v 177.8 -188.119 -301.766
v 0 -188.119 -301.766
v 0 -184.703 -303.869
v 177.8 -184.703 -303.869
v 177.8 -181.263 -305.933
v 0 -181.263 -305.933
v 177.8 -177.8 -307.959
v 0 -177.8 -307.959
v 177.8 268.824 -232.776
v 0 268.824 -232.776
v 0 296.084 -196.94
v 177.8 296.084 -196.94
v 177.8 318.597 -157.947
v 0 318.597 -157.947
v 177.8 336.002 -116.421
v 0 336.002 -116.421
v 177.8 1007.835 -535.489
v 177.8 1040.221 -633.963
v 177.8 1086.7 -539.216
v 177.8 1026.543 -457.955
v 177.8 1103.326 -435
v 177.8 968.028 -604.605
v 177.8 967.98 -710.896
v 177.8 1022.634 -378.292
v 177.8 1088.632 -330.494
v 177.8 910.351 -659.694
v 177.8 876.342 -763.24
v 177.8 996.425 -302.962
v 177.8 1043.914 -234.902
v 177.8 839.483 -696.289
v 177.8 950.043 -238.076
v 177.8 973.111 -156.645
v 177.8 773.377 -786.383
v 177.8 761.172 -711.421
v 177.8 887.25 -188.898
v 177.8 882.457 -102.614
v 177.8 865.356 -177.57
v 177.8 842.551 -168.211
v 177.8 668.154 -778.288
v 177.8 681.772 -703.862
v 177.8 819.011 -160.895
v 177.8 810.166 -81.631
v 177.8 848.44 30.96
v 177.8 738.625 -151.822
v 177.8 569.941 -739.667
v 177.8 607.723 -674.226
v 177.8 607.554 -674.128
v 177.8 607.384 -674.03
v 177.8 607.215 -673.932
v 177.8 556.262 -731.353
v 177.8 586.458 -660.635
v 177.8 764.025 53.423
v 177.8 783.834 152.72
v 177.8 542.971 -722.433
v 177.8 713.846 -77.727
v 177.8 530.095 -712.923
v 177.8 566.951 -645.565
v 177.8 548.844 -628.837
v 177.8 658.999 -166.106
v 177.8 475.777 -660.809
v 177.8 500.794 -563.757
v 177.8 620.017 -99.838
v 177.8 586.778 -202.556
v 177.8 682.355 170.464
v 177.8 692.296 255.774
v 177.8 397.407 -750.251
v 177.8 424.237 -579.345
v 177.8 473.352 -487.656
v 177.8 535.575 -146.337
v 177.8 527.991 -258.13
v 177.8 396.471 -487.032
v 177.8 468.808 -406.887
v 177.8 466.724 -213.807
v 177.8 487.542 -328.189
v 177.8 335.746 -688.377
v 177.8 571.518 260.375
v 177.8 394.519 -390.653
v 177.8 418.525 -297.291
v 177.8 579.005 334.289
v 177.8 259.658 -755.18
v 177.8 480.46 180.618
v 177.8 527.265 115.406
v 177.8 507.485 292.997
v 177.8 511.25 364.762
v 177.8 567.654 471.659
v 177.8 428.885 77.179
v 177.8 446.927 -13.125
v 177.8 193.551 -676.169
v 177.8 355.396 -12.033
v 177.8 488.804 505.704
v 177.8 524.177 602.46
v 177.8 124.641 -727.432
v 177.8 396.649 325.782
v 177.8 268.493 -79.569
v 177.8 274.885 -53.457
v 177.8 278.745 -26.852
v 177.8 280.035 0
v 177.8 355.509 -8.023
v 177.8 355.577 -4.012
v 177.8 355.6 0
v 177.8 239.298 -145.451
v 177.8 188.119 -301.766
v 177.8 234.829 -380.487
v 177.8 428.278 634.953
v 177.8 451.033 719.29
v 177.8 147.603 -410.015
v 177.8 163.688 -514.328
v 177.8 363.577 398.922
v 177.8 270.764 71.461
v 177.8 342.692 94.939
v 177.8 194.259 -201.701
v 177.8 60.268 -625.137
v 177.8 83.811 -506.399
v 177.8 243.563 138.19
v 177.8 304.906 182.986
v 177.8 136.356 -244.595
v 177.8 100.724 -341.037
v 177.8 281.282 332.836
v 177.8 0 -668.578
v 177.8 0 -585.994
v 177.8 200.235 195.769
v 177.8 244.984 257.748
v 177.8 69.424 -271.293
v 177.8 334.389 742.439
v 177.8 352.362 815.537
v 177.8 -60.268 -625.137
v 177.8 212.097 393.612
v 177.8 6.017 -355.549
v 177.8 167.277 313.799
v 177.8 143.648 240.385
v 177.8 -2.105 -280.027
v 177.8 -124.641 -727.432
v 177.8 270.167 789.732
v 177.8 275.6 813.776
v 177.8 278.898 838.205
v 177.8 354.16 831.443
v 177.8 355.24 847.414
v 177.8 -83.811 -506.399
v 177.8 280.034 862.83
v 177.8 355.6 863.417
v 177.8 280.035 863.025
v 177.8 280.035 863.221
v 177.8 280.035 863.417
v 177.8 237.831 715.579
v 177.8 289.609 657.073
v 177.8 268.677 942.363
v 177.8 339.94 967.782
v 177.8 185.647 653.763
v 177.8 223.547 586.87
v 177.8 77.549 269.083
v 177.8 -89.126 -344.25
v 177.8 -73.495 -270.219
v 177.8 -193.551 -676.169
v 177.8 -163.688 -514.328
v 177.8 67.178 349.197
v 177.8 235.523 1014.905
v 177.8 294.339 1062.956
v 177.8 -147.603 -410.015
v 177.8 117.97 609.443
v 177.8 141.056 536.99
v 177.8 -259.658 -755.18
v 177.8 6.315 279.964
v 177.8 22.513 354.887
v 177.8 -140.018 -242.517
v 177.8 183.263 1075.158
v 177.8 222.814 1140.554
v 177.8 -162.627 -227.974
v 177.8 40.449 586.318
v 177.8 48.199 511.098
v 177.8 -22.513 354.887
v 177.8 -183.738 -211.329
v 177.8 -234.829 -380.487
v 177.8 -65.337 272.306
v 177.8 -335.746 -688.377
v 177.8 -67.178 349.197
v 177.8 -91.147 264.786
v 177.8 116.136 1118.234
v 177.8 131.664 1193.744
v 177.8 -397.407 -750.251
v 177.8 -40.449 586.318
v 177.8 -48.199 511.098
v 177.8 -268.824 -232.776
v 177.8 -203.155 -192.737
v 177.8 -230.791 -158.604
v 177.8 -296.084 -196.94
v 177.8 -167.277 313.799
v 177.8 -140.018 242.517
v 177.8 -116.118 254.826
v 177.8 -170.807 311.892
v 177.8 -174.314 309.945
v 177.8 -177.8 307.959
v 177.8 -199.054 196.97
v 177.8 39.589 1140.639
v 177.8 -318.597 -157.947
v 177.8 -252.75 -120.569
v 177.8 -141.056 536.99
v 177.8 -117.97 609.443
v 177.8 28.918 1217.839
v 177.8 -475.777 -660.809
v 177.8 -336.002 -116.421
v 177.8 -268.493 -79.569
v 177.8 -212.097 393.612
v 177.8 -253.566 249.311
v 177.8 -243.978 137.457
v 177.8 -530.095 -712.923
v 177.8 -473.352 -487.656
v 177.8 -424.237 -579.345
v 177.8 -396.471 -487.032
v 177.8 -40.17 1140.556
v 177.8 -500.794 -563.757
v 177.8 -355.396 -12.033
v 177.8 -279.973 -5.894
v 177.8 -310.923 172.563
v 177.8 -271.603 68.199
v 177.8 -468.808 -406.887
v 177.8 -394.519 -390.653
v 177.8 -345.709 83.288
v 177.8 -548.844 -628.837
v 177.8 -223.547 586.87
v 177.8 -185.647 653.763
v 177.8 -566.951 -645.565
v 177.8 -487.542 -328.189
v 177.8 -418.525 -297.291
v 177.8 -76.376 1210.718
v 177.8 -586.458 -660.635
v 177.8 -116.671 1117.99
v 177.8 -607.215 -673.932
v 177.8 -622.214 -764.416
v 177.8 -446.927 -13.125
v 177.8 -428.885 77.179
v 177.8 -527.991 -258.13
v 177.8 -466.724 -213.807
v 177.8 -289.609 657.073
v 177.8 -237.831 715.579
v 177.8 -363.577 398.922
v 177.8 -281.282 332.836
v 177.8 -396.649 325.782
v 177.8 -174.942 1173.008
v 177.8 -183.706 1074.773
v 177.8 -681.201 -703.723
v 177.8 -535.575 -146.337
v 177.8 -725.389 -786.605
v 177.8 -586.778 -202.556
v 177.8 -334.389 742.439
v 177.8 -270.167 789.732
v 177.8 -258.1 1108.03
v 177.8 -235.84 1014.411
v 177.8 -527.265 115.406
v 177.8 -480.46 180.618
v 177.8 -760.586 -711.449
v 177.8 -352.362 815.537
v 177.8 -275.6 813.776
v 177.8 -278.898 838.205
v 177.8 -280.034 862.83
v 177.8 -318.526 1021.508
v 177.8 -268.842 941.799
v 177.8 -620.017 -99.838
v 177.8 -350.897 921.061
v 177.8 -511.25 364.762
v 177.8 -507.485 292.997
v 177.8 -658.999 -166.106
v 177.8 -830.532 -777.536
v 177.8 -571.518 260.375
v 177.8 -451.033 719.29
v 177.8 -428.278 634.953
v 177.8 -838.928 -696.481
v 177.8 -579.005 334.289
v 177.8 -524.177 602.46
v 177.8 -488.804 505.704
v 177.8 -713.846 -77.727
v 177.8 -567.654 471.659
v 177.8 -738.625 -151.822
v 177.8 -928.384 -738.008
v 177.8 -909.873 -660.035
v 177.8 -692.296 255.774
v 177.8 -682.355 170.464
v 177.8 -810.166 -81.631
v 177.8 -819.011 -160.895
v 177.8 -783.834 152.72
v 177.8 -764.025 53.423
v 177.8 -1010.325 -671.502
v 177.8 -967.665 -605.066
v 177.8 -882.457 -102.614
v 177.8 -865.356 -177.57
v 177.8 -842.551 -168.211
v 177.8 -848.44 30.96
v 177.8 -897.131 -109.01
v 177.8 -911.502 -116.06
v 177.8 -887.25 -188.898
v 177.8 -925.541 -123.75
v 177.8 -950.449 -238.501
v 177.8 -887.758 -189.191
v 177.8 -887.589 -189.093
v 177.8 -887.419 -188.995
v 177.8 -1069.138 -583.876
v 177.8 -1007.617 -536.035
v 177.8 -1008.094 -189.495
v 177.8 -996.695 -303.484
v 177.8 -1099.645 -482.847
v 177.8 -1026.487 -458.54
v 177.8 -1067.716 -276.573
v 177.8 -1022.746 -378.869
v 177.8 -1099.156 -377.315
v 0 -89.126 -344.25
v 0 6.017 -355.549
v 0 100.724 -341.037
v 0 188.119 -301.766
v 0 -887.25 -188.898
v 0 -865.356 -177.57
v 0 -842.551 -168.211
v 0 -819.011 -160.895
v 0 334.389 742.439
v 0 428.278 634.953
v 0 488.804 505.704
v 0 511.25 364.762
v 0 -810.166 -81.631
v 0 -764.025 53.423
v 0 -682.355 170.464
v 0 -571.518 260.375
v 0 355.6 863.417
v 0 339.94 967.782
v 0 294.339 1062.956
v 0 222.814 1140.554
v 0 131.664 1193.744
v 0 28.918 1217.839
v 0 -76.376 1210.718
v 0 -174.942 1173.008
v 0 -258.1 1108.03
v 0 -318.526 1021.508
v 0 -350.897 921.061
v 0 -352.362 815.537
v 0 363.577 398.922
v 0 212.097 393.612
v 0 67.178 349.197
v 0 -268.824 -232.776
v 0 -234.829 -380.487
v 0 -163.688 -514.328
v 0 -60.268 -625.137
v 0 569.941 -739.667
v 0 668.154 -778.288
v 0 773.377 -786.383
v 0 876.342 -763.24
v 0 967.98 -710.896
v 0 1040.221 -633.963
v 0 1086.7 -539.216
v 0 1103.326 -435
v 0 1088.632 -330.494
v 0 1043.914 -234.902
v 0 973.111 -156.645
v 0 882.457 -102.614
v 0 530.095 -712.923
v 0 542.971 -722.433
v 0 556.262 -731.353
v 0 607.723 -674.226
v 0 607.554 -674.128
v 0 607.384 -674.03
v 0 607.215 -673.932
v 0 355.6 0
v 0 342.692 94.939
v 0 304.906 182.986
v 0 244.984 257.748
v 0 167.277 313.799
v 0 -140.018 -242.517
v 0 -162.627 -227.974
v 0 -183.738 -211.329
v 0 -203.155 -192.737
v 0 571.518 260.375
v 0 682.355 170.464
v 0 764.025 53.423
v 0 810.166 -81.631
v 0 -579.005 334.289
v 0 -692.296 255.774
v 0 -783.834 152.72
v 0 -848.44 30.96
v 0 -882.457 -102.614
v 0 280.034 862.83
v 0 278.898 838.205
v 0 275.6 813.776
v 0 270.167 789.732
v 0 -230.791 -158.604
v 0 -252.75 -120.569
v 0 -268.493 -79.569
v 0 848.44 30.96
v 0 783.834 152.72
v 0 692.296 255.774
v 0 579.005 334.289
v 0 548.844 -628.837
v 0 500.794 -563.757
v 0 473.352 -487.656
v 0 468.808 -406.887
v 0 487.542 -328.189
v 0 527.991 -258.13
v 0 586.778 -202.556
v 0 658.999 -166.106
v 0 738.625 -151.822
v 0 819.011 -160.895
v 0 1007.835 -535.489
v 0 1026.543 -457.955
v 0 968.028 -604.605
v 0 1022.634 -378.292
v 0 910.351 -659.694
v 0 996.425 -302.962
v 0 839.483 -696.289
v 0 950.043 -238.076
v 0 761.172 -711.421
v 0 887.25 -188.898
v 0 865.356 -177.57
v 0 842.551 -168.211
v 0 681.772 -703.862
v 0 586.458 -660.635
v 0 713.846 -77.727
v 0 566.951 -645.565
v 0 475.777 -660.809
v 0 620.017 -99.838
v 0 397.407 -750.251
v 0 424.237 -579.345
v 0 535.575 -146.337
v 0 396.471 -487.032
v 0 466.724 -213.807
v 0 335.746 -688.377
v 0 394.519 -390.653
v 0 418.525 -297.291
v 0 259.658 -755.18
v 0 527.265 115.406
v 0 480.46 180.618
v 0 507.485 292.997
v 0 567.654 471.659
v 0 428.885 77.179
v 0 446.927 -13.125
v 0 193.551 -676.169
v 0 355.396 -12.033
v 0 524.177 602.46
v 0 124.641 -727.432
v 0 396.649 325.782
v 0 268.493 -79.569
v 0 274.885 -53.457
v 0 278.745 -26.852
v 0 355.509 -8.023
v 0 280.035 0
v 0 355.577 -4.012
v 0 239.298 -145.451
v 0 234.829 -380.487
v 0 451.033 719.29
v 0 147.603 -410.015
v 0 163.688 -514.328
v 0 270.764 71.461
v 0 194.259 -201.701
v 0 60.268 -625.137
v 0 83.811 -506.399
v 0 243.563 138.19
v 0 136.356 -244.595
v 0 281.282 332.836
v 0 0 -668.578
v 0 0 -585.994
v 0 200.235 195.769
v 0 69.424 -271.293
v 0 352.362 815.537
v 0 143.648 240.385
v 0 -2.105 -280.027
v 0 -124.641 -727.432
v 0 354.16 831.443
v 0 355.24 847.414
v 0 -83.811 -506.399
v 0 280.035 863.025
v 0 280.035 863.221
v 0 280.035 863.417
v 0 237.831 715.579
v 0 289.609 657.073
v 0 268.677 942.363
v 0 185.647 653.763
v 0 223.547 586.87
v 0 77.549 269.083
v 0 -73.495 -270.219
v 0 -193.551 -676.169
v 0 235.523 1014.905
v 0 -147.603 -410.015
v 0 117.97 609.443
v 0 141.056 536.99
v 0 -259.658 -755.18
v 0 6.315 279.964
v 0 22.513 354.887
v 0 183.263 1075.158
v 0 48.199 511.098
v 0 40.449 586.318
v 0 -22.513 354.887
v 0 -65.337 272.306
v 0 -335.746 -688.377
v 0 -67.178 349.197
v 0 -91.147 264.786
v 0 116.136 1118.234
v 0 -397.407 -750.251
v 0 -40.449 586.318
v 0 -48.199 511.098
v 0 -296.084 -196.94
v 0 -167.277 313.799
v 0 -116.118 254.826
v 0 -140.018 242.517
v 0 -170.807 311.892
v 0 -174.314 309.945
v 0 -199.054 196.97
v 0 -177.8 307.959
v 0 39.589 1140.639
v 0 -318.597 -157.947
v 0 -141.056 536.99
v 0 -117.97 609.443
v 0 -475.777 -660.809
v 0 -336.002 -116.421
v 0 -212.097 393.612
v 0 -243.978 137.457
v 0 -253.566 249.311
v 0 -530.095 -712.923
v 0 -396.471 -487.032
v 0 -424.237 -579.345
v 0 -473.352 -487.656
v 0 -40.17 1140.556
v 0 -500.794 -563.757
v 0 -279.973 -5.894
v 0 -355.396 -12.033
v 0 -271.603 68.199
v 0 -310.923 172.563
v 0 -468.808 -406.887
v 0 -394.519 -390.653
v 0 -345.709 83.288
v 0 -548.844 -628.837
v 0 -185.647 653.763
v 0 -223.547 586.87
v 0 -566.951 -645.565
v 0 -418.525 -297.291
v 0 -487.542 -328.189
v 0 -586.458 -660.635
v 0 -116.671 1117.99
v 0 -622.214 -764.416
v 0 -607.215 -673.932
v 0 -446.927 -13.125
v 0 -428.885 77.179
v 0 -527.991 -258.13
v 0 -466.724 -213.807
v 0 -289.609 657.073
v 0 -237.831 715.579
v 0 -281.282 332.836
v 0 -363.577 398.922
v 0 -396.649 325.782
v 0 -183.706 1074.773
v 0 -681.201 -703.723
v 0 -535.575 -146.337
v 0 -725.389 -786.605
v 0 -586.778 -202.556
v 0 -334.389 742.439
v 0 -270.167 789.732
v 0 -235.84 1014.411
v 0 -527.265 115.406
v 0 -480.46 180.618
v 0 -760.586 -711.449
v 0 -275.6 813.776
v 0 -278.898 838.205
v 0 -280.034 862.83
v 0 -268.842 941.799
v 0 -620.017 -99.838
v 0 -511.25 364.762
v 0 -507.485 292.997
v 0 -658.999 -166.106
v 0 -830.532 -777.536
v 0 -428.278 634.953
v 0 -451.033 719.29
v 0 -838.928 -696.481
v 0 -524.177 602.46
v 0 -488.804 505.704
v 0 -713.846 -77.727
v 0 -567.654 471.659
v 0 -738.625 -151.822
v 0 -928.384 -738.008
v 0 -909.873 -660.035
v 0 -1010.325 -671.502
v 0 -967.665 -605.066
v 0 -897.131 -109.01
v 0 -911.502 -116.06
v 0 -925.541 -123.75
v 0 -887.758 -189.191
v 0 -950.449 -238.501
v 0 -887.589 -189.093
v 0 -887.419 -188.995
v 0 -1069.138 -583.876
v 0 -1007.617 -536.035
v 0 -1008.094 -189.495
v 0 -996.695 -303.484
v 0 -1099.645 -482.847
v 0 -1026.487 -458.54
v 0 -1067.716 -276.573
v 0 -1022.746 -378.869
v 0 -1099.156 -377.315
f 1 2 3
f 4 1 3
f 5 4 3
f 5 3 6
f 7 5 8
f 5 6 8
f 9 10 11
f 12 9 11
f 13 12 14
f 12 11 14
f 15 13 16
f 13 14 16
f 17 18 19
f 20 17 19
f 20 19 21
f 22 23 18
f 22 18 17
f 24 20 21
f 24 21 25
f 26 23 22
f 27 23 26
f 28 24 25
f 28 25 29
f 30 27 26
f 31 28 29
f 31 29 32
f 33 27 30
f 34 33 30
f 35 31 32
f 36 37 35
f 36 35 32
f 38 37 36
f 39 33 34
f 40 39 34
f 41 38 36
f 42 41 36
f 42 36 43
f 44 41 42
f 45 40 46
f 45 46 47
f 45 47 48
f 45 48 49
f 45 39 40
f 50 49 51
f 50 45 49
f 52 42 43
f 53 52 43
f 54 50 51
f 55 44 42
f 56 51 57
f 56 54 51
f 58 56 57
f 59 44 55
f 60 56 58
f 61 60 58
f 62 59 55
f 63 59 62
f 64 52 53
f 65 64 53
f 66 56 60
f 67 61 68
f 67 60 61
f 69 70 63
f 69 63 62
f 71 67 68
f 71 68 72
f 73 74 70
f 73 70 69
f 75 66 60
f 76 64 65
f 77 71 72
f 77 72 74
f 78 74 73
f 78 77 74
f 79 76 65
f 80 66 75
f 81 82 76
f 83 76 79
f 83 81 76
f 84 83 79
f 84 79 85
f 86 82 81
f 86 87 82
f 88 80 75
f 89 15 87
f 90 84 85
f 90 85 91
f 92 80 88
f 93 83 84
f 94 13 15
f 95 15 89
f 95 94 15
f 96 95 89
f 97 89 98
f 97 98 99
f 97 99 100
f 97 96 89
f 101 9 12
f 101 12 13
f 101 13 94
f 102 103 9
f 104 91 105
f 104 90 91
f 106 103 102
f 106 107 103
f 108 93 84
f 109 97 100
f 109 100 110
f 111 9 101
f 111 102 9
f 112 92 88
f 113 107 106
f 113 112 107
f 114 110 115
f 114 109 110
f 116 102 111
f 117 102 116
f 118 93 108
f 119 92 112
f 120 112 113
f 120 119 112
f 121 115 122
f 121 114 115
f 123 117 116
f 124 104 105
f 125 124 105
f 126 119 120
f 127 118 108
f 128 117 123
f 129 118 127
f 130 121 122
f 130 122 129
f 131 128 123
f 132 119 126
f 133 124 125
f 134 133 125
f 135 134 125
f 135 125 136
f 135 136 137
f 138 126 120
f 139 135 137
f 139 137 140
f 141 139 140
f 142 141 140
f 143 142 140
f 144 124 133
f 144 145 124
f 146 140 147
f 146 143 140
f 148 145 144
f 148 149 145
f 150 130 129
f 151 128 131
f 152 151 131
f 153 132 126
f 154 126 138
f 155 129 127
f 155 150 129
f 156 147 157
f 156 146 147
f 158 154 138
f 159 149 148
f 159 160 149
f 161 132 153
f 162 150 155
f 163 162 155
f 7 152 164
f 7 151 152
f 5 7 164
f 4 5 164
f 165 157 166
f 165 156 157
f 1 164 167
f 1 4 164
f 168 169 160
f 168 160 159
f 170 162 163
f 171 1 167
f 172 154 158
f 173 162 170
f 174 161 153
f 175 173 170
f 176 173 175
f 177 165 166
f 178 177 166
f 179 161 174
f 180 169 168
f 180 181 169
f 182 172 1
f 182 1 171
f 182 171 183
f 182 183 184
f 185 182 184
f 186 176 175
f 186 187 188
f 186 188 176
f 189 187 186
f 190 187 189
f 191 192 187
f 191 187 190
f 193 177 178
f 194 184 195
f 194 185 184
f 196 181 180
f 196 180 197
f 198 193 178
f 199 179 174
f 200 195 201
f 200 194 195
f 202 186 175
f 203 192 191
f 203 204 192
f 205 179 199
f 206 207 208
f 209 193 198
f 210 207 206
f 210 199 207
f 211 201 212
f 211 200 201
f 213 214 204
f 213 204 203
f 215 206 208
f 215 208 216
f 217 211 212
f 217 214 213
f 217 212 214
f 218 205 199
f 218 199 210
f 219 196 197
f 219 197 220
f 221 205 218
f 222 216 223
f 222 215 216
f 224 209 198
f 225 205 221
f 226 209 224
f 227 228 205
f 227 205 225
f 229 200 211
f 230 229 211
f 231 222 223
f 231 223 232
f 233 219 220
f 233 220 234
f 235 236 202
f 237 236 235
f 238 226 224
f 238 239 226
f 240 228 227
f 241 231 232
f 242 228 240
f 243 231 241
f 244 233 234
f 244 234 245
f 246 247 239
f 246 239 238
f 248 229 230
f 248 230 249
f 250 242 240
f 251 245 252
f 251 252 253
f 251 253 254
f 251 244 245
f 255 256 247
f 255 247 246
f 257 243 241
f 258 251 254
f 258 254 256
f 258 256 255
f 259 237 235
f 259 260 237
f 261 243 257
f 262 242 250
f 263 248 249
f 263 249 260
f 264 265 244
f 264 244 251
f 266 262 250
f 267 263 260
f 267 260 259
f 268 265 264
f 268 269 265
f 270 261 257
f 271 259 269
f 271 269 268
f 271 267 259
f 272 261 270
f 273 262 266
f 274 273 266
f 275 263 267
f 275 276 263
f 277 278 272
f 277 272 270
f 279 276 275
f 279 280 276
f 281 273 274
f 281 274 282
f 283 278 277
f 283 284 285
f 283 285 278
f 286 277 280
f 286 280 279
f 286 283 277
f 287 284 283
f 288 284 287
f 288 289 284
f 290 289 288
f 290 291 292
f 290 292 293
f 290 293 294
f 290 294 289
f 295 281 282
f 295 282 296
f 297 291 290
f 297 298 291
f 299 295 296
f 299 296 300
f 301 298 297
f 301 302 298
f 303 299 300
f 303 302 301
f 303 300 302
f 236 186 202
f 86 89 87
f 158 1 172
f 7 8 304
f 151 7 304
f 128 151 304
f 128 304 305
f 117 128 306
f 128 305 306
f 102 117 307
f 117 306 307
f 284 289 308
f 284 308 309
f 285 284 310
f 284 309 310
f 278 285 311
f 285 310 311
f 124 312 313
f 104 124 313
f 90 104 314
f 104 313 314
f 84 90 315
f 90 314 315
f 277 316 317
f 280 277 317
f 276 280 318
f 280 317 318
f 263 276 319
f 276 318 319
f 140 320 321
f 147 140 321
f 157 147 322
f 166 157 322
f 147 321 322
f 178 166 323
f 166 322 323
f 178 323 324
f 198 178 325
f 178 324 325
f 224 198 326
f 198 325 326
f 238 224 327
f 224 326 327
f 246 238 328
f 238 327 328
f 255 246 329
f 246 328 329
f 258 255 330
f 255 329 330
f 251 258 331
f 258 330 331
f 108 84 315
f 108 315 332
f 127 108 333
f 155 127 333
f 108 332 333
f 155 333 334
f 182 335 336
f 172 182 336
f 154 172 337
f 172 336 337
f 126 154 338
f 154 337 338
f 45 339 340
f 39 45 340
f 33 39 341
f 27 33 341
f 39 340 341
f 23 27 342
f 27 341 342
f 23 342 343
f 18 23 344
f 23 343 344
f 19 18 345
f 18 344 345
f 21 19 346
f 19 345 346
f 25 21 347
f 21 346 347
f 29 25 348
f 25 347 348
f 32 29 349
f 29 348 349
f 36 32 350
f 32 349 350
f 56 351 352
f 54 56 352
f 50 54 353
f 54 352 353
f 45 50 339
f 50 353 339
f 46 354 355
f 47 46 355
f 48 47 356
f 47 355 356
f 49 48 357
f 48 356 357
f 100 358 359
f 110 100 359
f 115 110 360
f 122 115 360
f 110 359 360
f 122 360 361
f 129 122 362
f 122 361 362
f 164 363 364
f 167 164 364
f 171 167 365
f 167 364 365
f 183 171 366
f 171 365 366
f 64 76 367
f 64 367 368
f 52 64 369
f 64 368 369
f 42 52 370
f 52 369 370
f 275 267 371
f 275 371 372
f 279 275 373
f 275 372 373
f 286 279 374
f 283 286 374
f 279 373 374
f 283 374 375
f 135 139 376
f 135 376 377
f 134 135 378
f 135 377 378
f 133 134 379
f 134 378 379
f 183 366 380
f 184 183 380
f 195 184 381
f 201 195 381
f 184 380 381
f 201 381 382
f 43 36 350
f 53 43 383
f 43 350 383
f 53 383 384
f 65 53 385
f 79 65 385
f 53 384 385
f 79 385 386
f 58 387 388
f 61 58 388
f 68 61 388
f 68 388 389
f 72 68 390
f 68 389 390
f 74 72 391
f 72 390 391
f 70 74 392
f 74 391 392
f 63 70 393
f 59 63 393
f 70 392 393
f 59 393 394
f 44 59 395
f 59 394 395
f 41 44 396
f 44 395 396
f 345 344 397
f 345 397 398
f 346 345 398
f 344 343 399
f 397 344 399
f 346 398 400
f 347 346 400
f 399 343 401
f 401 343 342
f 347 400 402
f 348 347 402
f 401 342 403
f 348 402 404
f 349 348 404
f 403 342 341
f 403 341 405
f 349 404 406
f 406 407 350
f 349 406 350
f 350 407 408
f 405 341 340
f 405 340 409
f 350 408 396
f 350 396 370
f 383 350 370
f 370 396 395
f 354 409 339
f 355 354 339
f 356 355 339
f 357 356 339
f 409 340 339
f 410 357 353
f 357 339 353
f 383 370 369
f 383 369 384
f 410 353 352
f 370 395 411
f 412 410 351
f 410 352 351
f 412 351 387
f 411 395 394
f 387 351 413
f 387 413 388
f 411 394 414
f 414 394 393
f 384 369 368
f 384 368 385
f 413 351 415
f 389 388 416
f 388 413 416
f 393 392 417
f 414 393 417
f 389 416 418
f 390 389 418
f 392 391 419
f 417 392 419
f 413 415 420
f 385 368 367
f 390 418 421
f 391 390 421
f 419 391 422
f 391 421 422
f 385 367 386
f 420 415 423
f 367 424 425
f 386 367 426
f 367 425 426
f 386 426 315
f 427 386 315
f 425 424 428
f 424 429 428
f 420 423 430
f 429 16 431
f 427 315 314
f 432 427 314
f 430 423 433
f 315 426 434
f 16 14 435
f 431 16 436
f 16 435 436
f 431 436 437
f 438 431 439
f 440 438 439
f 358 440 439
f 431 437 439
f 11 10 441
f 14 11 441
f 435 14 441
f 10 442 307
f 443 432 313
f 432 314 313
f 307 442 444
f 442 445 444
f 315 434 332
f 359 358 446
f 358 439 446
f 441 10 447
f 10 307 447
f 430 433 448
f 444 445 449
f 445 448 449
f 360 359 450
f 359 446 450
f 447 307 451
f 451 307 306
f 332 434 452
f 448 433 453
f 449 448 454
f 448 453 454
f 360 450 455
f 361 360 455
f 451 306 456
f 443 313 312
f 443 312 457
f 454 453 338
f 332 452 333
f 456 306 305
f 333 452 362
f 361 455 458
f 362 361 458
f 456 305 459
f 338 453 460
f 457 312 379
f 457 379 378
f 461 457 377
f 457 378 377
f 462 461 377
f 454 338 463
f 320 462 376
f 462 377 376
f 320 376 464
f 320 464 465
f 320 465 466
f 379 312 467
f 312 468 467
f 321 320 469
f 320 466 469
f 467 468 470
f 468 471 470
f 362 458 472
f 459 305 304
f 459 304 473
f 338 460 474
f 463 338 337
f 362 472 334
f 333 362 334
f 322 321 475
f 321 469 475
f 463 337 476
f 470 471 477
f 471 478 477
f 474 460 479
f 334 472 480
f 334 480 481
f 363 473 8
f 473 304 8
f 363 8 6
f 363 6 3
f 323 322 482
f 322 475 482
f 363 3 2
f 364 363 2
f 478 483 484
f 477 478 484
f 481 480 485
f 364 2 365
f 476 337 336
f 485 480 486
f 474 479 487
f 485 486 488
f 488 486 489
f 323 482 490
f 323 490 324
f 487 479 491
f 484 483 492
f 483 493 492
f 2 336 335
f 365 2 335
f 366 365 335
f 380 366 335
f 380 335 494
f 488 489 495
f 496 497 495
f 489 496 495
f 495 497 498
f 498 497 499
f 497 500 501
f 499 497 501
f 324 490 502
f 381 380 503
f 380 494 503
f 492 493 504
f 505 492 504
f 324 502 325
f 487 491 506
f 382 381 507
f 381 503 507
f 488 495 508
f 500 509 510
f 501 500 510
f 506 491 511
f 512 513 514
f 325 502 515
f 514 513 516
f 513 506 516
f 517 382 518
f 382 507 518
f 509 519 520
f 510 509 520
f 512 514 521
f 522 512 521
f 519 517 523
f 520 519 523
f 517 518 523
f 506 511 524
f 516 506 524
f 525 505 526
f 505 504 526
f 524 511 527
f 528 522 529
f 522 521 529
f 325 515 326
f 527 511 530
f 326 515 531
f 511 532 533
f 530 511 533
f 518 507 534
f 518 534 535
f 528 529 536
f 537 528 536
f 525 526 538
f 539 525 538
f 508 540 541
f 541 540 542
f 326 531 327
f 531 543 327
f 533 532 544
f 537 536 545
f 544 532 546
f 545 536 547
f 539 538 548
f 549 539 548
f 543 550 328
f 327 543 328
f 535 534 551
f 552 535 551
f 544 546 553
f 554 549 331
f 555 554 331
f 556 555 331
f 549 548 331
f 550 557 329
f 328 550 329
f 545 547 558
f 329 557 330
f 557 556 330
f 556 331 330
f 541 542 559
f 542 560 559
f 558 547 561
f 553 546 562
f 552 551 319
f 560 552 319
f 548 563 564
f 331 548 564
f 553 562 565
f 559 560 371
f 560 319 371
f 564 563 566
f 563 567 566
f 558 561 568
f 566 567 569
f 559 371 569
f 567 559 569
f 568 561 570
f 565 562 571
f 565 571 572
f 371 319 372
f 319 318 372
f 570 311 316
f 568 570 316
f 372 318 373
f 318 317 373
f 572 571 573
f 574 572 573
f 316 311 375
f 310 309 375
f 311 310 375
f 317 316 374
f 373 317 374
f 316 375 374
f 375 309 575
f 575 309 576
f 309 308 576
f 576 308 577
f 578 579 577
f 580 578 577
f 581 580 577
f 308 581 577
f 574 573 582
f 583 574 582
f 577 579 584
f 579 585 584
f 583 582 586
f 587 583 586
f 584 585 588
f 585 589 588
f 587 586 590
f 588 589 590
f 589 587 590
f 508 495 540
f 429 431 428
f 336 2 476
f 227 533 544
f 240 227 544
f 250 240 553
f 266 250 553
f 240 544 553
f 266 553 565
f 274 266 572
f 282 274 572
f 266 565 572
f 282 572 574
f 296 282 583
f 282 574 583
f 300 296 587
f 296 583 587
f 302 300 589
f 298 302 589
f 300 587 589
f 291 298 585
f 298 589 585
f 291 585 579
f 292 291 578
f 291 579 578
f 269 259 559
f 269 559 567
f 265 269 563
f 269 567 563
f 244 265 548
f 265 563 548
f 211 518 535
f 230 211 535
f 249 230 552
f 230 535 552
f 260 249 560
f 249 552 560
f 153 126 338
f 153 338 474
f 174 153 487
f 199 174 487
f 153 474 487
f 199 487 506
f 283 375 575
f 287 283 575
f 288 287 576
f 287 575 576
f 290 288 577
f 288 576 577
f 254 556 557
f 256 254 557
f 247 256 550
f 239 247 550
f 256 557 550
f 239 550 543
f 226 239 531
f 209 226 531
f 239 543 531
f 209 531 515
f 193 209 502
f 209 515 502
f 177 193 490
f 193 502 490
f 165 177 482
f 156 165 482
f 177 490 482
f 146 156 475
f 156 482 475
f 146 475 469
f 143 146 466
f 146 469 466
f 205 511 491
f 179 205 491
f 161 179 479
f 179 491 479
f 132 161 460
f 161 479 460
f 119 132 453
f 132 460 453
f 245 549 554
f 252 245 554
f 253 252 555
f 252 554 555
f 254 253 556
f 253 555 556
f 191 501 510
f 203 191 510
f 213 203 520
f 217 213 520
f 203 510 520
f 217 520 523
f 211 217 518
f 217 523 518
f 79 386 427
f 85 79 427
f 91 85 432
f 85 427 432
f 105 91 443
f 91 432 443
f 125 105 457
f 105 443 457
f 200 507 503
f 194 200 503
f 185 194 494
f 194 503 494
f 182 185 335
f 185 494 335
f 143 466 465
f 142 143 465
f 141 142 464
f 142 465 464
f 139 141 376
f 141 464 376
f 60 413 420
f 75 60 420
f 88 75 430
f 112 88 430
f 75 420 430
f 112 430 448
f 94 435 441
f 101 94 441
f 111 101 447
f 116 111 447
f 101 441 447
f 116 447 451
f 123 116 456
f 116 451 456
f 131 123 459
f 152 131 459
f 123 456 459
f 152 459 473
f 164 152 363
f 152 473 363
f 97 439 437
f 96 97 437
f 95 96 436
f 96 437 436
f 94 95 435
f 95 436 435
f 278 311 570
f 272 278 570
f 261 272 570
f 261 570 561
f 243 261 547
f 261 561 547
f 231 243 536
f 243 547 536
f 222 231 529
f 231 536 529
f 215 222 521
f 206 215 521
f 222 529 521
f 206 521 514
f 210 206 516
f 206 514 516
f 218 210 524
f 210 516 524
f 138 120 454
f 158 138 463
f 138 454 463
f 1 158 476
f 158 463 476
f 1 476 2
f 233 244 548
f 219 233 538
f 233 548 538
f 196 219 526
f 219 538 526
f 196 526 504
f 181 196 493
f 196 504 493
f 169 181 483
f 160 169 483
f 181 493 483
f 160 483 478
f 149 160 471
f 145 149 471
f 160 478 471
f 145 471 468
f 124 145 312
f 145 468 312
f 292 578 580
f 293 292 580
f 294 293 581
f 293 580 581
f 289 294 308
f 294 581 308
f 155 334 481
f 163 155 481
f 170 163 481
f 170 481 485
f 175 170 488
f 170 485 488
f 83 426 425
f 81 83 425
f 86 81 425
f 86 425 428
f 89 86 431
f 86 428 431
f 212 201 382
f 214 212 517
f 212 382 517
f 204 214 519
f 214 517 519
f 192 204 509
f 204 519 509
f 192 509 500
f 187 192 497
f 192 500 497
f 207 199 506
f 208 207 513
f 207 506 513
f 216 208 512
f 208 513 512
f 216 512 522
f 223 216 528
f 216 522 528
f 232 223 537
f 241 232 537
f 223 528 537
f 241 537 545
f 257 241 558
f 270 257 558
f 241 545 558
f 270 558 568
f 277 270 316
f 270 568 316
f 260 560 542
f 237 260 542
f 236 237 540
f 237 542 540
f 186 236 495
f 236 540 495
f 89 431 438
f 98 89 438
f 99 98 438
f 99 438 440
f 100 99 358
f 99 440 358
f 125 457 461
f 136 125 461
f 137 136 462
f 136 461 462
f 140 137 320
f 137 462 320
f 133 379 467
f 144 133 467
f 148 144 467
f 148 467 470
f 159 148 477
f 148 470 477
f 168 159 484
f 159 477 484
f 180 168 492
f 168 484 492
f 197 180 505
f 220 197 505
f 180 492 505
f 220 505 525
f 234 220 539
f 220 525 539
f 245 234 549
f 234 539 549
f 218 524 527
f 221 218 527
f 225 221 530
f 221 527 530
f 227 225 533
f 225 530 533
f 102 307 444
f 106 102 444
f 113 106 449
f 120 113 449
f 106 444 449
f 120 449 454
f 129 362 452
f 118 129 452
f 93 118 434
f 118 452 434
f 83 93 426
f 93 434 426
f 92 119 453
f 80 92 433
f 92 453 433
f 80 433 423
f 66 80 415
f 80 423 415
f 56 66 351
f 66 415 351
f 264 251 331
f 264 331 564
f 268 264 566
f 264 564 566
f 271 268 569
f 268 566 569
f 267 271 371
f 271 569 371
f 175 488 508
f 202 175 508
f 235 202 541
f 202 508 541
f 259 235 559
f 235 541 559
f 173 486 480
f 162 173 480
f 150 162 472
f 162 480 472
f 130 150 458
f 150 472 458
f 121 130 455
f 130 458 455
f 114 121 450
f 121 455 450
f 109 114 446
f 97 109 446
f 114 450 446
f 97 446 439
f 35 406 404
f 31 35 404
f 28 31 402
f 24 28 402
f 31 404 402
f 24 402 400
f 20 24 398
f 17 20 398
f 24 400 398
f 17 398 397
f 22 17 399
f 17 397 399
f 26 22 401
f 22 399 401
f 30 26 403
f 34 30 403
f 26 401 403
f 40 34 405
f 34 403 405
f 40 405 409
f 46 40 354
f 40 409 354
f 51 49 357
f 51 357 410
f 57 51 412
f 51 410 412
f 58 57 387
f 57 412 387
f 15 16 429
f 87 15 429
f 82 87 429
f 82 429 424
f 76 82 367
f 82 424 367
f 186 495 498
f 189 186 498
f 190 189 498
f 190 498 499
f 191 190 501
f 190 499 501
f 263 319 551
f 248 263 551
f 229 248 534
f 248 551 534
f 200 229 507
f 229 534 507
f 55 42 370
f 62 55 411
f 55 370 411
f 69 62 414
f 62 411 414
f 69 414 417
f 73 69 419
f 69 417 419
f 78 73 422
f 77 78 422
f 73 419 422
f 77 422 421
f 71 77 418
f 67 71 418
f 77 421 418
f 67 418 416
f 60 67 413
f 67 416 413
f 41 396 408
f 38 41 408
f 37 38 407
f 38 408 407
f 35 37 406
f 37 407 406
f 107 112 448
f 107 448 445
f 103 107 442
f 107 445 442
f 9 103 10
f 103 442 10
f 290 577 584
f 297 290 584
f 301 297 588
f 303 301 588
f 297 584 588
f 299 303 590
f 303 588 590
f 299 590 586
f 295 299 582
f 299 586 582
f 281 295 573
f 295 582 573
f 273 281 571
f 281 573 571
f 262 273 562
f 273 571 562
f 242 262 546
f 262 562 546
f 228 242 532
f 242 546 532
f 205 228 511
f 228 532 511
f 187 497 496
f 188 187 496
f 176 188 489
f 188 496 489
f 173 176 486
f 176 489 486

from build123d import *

# Parameters (mm, degrees)
F1_DEPTH = 177.8
F2_COUNT = 3


with BuildPart() as f1:
    # F0 (on Right) → F1 (new body)
    with BuildSketch(Plane.YZ):
        with BuildLine():
            ThreePointArc((-268.4926933874, -79.5693082951), (-313.7669030634, -48.1461873832), (-355.396348822, -12.0330895451))
            ThreePointArc((-355.396348822, -12.0330895451), (-349.6172674569, -64.9548019471), (-336.0023494952, -116.4207074952))
            ThreePointArc((-336.0023494952, -116.4207074952), (-275.6466077337, -154.0273882117), (-211.1384628897, -183.9569262452))
            ThreePointArc((-211.1384628897, -183.9569262452), (-245.4296339346, -134.8476770721), (-268.4926933874, -79.5693082951))
        make_face()
        with BuildLine():
            ThreePointArc((-336.0023494952, -116.4207074952), (-349.6172674569, -64.9548019471), (-355.396348822, -12.0330895451))
            ThreePointArc((-355.396348822, -12.0330895451), (-511.134133308, 369.8320431433), (-334.3887781327, 742.4394994612))
            ThreePointArc((-334.3887781327, 742.4394994612), (-345.3149861043, 778.5114296956), (-352.361893863, 815.5371945428))
            ThreePointArc((-352.361893863, 815.5371945428), (-579.3079627247, 345.4308557736), (-336.0023494952, -116.4207074952))
        make_face()
        with BuildLine():
            ThreePointArc((511.3322337625, 355.6), (470.7367959904, 155.9314692167), (355.396348822, -12.0330895451))
            ThreePointArc((355.396348822, -12.0330895451), (349.6172674569, -64.9548019471), (336.0023494952, -116.4207074952))
            ThreePointArc((336.0023494952, -116.4207074952), (514.9659945491, 90.0606401517), (579.3972101854, 355.6))
            ThreePointArc((579.3972101854, 355.6), (519.5472189563, 612.0601615171), (352.361893863, 815.5371945428))
            ThreePointArc((352.361893863, 815.5371945428), (345.3149861043, 778.5114296956), (334.3887781327, 742.4394994612))
            ThreePointArc((334.3887781327, 742.4394994612), (464.9969968463, 568.2933149123), (511.3322337625, 355.6))
        make_face()
        with BuildLine():
            ThreePointArc((336.0023494952, -116.4207074952), (349.6172674569, -64.9548019471), (355.396348822, -12.0330895451))
            ThreePointArc((355.396348822, -12.0330895451), (313.7669030634, -48.1461873832), (268.4926933874, -79.5693082951))
            ThreePointArc((268.4926933874, -79.5693082951), (245.4296339346, -134.8476770721), (211.1384628897, -183.9569262452))
            ThreePointArc((211.1384628897, -183.9569262452), (275.6466077337, -154.0273882117), (336.0023494952, -116.4207074952))
        make_face()
        with BuildLine():
            ThreePointArc((-211.1384628897, -183.9569262452), (-275.6466077337, -154.0273882117), (-336.0023494952, -116.4207074952))
            ThreePointArc((-336.0023494952, -116.4207074952), (0, -355.6), (336.0023494952, -116.4207074952))
            ThreePointArc((336.0023494952, -116.4207074952), (275.6466077337, -154.0273882117), (211.1384628897, -183.9569262452))
            ThreePointArc((211.1384628897, -183.9569262452), (0, -280.035), (-211.1384628897, -183.9569262452))
        make_face()
        with BuildLine():
            ThreePointArc((-352.361893863, 815.5371945428), (-345.3149861043, 778.5114296956), (-334.3887781327, 742.4394994612))
            ThreePointArc((-334.3887781327, 742.4394994612), (-303.2012975673, 767.3397557172), (-270.1668730977, 789.7319084854))
            ThreePointArc((-270.1668730977, 789.7319084854), (-277.5178808464, 825.9544493975), (-280.0343843816, 862.8296035669))
            ThreePointArc((-280.0343843816, 862.8296035669), (-317.0810719236, 840.5337284603), (-352.361893863, 815.5371945428))
        make_face()
        with BuildLine():
            ThreePointArc((355.6, 863.4167909622), (-23.994484182, 1218.2063408771), (-352.361893863, 815.5371945428))
            ThreePointArc((-352.361893863, 815.5371945428), (-317.0810719236, 840.5337284603), (-280.0343843816, 862.8296035669))
            ThreePointArc((-280.0343843816, 862.8296035669), (-0.293593859, 1143.4516370576), (280.035, 863.4167909622))
            ThreePointArc((280.035, 863.4167909622), (280.0348460953, 863.1231971032), (280.0343843816, 862.8296035669))
            ThreePointArc((280.0343843816, 862.8296035669), (317.0810719236, 840.5337284603), (352.361893863, 815.5371945428))
            ThreePointArc((352.361893863, 815.5371945428), (354.7895499149, 839.4223067802), (355.6, 863.4167909622))
        make_face()
        with BuildLine():
            ThreePointArc((270.1668730977, 789.7319084854), (303.2012975673, 767.3397557172), (334.3887781327, 742.4394994612))
            ThreePointArc((334.3887781327, 742.4394994612), (345.3149861043, 778.5114296956), (352.361893863, 815.5371945428))
            ThreePointArc((352.361893863, 815.5371945428), (317.0810719236, 840.5337284603), (280.0343843816, 862.8296035669))
            ThreePointArc((280.0343843816, 862.8296035669), (277.5178808464, 825.9544493975), (270.1668730977, 789.7319084854))
        make_face()
        with BuildLine():
            ThreePointArc((-270.1668730977, 789.7319084854), (-303.2012975673, 767.3397557172), (-334.3887781327, 742.4394994612))
            ThreePointArc((-334.3887781327, 742.4394994612), (0, 507.8167909622), (334.3887781327, 742.4394994612))
            ThreePointArc((334.3887781327, 742.4394994612), (303.2012975673, 767.3397557172), (270.1668730977, 789.7319084854))
            ThreePointArc((270.1668730977, 789.7319084854), (0, 583.3817909622), (-270.1668730977, 789.7319084854))
        make_face()
        with BuildLine():
            ThreePointArc((355.396348822, -12.0330895451), (355.5490835603, -6.0174063724), (355.6, 0))
            ThreePointArc((355.6, 0), (-6.0174063724, 355.5490835603), (-355.396348822, -12.0330895451))
            ThreePointArc((-355.396348822, -12.0330895451), (-313.7669030634, -48.1461873832), (-268.4926933874, -79.5693082951))
            ThreePointArc((-268.4926933874, -79.5693082951), (-40.2010561568, 277.1344011646), (280.035, 0))
            ThreePointArc((280.035, 0), (277.1344011646, -40.2010561568), (268.4926933874, -79.5693082951))
            ThreePointArc((268.4926933874, -79.5693082951), (313.7669030634, -48.1461873832), (355.396348822, -12.0330895451))
        make_face()
    extrude(amount=F1_DEPTH)

    # F2: F1 ×3 about axis
    f2_axis = Axis((0, -4e-10, 0), (-1, 0, 0))


with BuildPart() as f1_1:
    add(f1.part)
    for i in range(1, F2_COUNT):
        add(f1.part.rotate(f2_axis, i * 360 / F2_COUNT))


solid = f1_1.part
